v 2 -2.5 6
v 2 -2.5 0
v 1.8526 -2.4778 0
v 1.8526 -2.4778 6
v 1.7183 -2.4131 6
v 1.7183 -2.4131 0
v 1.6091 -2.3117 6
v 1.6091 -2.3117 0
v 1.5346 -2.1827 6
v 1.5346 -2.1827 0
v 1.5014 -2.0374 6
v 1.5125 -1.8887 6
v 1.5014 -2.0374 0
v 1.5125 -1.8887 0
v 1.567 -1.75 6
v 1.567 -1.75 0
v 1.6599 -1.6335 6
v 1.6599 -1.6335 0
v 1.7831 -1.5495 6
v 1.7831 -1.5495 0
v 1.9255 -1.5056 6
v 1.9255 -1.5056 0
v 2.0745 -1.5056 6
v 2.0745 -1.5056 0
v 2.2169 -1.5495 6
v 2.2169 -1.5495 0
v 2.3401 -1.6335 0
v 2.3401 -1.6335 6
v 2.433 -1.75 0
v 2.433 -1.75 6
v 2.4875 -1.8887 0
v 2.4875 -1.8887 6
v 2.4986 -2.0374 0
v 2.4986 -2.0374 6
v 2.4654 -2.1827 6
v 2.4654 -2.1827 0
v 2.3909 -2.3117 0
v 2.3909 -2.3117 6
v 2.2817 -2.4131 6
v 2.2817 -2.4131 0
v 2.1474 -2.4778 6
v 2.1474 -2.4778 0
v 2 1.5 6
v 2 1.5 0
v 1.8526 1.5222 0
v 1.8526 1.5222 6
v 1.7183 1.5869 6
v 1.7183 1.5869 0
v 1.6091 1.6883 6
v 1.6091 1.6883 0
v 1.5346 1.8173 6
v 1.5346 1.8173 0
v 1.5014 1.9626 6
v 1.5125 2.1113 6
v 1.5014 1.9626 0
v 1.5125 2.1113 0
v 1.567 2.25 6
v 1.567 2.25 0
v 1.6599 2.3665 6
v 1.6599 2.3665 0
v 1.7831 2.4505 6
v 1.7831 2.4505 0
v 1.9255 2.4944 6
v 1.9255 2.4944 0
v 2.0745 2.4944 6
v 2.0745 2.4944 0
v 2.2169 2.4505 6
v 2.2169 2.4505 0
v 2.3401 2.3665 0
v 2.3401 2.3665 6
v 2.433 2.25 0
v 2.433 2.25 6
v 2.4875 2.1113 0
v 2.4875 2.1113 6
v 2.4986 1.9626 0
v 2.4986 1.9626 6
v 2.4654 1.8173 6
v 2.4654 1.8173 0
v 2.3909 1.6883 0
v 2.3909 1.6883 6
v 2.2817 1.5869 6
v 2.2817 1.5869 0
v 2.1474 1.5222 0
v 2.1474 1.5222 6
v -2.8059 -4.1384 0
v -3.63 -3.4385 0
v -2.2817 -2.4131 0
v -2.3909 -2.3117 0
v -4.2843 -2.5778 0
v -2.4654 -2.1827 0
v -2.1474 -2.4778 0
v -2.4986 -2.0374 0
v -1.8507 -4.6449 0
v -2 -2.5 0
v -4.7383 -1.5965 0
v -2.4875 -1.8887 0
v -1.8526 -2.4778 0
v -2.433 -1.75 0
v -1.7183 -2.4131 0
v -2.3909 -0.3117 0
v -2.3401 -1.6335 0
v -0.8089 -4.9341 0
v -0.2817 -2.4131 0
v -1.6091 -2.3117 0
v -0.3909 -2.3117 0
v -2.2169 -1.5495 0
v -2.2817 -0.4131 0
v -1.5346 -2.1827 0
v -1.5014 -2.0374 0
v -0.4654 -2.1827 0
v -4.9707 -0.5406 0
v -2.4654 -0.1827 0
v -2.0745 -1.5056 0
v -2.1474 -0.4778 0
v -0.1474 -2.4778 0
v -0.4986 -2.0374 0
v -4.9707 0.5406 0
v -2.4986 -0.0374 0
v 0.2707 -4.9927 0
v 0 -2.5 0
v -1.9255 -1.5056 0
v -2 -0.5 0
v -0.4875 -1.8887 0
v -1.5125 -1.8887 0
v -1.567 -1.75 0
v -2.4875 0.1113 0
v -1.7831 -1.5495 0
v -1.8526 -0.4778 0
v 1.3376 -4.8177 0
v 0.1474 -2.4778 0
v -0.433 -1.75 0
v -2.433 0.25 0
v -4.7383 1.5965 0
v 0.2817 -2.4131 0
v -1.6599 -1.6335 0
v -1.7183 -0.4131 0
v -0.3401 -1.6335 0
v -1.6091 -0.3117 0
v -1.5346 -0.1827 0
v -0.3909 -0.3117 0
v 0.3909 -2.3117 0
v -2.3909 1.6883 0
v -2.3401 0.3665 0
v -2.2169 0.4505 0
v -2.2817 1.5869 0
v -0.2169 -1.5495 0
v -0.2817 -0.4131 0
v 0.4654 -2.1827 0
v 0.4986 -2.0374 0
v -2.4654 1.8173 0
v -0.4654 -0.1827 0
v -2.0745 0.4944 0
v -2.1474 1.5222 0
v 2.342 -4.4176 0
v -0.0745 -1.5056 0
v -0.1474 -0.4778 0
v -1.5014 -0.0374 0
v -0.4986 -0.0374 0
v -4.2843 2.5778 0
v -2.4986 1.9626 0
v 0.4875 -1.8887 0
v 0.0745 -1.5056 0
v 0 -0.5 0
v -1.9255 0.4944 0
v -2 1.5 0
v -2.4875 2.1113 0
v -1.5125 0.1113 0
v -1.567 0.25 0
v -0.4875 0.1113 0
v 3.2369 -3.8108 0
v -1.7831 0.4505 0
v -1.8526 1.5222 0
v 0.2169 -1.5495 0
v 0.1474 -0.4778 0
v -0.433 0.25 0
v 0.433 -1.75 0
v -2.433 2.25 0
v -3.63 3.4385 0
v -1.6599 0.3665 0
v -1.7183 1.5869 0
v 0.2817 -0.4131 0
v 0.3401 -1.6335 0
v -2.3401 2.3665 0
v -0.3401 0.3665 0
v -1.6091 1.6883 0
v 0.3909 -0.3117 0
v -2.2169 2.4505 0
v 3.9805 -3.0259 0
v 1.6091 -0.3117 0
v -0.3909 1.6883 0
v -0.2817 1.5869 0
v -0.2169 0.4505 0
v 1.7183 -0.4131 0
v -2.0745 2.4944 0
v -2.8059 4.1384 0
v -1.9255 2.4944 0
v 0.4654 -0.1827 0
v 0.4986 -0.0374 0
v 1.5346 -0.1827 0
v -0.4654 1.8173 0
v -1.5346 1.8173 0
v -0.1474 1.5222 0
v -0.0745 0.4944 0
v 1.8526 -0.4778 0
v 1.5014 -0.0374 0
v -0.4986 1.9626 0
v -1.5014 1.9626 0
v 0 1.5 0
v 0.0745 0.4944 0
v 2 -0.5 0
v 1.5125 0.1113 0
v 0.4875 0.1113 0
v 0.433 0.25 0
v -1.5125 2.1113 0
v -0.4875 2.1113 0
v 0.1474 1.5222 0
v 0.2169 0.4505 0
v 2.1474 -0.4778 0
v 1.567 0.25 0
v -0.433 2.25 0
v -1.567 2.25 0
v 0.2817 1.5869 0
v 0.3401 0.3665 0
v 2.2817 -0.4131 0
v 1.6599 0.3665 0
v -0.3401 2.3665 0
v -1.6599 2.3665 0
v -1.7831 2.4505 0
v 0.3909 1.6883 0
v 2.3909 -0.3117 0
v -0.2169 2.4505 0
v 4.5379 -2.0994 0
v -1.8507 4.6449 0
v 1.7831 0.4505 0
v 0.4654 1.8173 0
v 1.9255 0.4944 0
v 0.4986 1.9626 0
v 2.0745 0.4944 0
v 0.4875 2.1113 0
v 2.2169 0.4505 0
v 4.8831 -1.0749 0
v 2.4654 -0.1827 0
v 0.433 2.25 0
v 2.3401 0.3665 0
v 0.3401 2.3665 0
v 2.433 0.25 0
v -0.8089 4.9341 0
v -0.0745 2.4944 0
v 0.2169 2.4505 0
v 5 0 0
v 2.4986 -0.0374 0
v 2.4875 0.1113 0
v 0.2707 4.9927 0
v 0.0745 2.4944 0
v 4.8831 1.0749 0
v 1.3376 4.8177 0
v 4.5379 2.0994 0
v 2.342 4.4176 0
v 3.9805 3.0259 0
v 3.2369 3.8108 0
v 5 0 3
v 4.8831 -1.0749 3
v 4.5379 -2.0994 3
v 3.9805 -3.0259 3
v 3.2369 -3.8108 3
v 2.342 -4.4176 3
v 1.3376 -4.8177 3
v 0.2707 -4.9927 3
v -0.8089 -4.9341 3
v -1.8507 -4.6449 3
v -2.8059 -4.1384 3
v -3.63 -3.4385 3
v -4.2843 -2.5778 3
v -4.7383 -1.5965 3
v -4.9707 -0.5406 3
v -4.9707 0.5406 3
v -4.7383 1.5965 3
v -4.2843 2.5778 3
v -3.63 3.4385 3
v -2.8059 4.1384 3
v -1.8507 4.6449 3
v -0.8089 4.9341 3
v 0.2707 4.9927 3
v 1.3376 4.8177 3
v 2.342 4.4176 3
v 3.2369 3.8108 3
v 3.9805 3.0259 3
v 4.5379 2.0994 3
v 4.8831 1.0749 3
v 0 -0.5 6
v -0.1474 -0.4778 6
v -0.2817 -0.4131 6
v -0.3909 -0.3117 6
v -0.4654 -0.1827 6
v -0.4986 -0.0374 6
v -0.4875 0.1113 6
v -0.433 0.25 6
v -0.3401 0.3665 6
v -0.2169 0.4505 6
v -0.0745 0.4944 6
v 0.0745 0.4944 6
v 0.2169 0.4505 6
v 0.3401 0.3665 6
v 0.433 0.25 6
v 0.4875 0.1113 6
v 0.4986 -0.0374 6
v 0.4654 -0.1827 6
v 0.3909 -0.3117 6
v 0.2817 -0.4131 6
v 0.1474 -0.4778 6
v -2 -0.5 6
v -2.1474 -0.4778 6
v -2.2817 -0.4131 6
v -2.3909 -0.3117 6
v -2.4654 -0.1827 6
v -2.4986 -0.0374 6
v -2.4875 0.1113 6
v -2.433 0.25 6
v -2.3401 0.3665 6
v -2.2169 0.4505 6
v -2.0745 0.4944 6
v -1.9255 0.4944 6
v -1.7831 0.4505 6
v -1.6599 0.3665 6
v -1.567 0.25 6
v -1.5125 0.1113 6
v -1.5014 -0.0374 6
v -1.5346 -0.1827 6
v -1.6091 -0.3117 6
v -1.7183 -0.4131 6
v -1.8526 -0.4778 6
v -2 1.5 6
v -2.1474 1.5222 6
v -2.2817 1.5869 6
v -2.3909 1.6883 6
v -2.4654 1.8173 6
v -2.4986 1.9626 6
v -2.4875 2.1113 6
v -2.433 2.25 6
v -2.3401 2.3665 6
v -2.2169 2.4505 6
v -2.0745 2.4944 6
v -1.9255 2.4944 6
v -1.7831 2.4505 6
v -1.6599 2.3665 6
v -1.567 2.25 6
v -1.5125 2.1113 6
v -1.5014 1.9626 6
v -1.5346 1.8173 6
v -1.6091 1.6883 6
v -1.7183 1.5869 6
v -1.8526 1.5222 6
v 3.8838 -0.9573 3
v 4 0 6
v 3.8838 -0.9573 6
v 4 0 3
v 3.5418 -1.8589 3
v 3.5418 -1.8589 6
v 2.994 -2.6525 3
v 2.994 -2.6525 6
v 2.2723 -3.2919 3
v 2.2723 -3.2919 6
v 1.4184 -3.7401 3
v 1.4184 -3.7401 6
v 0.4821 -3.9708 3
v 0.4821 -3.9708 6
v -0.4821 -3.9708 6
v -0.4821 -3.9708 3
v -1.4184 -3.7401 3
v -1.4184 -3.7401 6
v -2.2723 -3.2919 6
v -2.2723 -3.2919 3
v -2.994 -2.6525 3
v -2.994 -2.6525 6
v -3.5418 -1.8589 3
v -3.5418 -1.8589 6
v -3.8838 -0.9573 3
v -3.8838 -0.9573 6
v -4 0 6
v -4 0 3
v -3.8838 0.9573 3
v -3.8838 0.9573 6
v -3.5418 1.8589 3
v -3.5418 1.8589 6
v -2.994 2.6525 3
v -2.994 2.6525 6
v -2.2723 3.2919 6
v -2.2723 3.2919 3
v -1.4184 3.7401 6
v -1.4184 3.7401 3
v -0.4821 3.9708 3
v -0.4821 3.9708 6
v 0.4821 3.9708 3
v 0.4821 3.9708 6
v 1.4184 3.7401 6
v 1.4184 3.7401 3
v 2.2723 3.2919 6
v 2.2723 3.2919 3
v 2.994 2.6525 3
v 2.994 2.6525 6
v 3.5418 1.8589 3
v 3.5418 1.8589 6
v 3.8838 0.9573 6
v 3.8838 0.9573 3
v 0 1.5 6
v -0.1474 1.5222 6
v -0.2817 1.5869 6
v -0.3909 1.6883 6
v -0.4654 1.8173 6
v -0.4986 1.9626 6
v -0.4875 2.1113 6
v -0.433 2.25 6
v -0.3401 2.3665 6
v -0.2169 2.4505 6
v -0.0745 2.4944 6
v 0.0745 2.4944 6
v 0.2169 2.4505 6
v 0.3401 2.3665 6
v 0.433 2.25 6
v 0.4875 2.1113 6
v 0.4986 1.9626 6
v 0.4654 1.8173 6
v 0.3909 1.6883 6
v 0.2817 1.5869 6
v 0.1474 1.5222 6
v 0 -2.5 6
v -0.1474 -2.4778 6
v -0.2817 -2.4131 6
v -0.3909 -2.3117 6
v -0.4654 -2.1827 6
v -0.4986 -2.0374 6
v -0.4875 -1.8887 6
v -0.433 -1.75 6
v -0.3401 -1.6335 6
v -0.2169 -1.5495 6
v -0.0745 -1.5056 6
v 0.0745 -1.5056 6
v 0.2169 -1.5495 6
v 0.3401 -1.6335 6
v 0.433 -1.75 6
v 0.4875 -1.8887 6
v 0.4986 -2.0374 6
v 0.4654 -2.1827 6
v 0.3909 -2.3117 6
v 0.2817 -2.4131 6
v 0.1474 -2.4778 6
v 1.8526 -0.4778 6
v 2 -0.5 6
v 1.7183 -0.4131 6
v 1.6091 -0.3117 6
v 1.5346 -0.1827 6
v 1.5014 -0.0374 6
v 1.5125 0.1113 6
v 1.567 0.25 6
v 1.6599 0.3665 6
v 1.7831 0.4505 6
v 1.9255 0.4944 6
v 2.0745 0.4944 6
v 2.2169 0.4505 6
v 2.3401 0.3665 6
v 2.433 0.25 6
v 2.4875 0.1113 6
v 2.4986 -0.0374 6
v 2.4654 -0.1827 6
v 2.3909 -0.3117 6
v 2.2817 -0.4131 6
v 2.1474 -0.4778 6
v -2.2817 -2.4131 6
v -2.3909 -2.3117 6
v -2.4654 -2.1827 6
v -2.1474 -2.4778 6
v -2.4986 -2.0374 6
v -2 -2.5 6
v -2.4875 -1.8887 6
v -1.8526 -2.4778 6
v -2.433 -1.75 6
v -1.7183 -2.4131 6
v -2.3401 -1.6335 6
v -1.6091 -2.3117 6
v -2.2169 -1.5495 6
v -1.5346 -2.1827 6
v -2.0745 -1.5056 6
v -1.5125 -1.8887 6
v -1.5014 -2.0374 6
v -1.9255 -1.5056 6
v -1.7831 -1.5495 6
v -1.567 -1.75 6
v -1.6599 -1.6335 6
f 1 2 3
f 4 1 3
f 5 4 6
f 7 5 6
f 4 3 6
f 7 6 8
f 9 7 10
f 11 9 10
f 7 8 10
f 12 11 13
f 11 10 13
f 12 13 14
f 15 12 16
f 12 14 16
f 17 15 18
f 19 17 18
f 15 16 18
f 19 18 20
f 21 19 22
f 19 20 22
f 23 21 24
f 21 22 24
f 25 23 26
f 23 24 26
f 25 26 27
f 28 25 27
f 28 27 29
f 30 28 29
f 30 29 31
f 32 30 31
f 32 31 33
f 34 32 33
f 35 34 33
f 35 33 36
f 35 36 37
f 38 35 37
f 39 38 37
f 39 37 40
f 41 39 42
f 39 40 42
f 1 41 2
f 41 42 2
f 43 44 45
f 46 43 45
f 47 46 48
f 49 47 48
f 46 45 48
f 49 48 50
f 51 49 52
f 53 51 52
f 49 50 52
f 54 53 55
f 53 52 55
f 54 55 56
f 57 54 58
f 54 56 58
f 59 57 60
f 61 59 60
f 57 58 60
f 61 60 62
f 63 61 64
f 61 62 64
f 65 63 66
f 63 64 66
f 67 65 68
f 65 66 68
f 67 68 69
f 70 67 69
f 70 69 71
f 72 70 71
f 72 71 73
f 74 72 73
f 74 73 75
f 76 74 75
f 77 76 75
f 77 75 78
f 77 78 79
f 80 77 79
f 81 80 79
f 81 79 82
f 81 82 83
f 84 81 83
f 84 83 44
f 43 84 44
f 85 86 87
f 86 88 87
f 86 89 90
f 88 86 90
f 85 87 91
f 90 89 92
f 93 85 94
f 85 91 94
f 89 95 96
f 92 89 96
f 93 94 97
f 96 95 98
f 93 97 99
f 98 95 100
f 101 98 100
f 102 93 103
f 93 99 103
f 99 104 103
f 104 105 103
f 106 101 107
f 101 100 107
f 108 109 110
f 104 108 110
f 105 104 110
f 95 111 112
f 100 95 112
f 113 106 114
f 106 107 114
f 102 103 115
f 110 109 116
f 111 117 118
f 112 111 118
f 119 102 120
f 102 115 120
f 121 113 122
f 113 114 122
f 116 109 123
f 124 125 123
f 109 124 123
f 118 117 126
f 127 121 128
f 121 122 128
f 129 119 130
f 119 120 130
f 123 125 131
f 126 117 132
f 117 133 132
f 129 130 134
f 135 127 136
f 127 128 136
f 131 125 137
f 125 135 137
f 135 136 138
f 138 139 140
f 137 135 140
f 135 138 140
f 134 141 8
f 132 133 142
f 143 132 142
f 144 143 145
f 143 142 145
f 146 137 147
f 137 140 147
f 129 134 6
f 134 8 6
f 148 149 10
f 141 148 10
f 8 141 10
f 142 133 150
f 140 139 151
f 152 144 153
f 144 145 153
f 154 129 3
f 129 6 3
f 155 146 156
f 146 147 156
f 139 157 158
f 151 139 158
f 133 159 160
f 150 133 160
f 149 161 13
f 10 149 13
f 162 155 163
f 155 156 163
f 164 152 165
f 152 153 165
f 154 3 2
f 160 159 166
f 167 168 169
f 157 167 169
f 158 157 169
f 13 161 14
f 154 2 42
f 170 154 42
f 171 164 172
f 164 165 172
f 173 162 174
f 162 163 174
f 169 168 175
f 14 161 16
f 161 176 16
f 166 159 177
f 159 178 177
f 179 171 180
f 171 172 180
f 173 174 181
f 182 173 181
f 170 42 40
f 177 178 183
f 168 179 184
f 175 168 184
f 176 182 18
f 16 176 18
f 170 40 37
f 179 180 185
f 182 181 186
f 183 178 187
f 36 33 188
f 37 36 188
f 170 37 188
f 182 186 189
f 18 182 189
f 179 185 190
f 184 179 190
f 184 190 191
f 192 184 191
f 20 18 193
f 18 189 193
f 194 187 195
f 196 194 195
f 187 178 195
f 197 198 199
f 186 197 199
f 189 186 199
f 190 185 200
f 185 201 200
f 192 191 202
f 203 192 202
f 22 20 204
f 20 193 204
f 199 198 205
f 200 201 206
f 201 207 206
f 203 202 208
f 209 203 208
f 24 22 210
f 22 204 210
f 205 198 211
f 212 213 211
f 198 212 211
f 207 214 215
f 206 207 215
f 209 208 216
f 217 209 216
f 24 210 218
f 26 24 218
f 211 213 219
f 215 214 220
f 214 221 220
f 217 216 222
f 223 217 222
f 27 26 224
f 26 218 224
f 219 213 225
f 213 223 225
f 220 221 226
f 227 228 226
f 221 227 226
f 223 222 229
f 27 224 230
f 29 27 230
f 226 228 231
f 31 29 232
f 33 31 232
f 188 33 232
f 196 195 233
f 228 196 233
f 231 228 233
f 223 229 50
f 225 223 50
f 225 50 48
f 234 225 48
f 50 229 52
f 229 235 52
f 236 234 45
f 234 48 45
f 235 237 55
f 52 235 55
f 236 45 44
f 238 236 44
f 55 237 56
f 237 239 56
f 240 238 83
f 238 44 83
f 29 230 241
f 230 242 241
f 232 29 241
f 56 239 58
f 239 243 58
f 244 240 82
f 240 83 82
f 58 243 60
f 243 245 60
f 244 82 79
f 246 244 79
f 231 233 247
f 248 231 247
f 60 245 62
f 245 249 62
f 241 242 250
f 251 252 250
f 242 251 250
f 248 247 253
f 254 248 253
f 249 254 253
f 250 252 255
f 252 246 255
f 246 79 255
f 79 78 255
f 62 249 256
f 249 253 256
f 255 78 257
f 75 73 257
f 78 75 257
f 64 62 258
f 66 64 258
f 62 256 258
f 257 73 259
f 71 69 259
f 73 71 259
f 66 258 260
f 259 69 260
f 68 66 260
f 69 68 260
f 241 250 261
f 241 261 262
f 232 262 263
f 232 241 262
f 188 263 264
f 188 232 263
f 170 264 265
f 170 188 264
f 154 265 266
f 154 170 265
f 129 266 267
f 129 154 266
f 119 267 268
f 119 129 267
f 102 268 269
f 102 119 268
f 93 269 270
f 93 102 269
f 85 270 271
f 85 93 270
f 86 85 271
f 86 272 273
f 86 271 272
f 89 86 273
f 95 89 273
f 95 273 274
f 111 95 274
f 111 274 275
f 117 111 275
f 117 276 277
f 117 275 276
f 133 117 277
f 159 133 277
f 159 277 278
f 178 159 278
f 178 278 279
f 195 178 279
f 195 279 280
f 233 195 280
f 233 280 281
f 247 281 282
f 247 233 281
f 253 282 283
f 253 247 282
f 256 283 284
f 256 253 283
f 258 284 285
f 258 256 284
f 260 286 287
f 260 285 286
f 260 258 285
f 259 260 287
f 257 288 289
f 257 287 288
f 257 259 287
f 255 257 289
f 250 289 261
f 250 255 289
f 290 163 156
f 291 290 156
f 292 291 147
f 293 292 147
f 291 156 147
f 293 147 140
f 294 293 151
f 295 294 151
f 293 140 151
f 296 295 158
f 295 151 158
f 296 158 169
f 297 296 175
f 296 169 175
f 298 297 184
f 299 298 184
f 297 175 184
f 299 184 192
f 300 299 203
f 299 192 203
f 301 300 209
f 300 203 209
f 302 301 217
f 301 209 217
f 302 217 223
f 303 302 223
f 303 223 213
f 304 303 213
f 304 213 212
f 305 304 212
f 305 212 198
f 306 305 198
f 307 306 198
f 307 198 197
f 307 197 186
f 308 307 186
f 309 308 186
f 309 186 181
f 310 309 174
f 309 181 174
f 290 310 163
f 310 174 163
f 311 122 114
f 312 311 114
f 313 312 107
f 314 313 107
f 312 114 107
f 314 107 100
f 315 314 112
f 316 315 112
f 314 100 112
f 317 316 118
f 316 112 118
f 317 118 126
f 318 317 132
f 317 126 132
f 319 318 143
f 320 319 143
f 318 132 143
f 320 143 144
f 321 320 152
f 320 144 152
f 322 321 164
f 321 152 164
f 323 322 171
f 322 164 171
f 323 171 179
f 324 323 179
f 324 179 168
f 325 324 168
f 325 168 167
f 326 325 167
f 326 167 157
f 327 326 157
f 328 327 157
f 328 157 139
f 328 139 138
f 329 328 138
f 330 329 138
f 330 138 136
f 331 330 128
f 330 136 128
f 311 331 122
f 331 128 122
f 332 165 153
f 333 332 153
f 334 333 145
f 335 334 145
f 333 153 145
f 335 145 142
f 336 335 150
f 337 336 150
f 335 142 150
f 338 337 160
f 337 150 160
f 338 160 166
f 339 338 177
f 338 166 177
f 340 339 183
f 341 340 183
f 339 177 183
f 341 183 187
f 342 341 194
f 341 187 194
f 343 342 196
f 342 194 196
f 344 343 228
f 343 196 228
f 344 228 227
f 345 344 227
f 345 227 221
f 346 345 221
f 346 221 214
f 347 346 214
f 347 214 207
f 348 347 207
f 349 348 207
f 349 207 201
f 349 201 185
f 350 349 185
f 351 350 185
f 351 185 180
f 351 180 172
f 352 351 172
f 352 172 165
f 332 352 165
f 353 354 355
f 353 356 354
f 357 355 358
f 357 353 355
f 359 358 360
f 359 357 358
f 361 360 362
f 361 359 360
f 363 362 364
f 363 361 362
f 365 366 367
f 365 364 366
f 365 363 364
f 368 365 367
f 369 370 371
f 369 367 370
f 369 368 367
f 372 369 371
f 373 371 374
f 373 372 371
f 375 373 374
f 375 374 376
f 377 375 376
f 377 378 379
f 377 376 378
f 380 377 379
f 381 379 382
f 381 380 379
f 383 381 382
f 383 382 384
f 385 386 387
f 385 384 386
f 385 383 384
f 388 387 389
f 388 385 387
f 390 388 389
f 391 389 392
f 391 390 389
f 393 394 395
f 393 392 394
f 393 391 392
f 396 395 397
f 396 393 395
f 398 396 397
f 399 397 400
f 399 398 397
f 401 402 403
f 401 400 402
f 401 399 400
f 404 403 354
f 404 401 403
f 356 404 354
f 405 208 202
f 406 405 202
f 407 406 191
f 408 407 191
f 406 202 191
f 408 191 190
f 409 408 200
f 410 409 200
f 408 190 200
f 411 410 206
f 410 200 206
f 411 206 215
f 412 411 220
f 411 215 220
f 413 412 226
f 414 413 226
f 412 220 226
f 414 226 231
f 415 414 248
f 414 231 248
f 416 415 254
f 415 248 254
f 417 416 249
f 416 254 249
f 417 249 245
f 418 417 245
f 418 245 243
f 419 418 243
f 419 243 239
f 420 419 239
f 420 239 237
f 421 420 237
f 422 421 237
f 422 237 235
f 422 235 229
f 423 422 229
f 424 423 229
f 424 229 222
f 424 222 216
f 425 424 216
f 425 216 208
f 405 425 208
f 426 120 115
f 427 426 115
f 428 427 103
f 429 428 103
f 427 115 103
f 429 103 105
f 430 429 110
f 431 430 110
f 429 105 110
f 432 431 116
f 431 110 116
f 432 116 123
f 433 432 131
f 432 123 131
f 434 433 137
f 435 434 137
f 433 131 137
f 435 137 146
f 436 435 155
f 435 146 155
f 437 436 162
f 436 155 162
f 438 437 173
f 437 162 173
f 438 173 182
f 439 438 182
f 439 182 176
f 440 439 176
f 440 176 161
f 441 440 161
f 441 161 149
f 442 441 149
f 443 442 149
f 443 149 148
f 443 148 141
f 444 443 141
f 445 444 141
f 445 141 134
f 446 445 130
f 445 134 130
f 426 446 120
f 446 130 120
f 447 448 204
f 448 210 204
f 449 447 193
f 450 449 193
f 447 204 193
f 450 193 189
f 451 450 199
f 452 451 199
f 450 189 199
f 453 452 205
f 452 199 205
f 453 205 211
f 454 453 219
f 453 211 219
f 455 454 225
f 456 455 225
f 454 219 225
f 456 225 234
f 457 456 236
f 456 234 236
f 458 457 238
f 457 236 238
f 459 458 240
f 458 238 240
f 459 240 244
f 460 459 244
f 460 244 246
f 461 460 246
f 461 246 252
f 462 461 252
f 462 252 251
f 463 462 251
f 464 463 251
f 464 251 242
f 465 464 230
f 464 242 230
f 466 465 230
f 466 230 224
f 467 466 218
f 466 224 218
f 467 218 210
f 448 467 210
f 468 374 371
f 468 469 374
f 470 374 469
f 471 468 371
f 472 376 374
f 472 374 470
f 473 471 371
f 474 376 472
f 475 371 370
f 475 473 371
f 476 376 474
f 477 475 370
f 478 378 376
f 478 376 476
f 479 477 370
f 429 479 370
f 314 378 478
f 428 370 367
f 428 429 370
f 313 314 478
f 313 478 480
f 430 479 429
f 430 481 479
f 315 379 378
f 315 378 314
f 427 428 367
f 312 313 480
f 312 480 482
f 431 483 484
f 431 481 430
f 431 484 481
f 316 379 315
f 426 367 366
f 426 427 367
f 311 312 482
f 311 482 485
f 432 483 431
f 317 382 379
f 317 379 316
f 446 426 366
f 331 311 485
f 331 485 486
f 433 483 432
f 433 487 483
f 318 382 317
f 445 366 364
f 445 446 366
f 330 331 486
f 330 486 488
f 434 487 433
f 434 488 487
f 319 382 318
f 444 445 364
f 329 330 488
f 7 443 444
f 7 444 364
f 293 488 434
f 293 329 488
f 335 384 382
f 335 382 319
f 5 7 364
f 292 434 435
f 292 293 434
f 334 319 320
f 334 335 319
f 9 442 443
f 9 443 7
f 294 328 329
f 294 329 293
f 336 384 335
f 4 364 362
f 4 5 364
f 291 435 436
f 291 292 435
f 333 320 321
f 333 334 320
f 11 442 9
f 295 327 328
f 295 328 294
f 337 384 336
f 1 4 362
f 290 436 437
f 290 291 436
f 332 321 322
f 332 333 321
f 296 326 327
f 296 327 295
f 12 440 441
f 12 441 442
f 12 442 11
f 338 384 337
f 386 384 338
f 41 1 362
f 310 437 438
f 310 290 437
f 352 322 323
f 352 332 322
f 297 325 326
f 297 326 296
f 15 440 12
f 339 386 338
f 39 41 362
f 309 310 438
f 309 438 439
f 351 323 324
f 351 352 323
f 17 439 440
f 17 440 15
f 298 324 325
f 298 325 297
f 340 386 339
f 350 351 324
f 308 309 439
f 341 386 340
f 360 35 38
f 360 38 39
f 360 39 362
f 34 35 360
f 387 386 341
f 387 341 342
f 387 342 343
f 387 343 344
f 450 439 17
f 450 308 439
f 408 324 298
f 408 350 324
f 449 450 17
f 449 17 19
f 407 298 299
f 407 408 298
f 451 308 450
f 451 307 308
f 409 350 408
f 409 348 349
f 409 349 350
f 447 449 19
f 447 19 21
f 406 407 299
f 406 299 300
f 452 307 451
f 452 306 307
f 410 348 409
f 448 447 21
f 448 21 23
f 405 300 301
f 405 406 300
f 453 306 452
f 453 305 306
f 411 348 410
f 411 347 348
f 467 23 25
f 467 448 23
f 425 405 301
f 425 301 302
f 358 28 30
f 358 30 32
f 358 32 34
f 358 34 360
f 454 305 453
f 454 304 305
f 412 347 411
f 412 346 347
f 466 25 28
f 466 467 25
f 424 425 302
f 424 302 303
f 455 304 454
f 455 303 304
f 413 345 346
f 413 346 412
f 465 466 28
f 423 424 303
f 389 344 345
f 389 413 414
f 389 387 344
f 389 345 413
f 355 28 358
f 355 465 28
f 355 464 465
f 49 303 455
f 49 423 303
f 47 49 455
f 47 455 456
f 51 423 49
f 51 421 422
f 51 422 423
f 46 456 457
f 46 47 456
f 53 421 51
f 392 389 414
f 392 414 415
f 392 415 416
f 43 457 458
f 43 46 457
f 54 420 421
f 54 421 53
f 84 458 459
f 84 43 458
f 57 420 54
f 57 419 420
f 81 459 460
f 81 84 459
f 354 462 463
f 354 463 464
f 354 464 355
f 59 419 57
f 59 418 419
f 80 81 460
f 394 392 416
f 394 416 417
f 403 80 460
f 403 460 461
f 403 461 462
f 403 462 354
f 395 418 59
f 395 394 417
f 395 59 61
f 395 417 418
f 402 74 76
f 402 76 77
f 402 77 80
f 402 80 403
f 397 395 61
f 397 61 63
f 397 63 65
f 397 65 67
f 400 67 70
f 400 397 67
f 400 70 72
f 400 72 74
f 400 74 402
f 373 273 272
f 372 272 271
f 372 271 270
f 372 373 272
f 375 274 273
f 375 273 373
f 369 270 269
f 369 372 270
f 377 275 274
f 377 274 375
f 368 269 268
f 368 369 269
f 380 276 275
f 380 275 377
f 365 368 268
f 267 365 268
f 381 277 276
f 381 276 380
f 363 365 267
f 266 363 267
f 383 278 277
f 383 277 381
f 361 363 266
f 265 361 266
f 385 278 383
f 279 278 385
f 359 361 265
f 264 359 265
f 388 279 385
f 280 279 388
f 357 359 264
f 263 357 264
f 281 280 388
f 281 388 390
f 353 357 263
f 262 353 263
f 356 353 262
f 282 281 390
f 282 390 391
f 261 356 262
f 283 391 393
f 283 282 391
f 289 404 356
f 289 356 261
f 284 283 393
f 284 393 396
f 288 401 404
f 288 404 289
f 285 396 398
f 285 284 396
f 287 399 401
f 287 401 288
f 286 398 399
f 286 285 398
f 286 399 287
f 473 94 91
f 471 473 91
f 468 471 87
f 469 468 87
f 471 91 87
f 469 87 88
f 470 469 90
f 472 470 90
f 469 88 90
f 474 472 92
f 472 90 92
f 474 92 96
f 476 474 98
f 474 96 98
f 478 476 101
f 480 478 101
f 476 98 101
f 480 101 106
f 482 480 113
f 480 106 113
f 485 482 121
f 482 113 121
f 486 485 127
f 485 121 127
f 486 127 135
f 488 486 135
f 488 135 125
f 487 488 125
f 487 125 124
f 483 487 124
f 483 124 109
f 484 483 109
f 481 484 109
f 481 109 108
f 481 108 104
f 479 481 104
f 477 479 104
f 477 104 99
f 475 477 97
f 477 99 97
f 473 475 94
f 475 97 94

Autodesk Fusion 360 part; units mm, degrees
sketch "Sketch1" plane through (0, 0, 0) normal (0, 0, 1) x (1, 0, 0)
  circle A0 centre (0, 0) radius 4
  circle A1 centre (0, 0) radius 5
  dimension "d1" = 8
  dimension "d2" = 1
extrude "Extrude1" add sketch "Sketch1" along normal blind 3
extrude "Extrude2" add sketch "Sketch1" along normal blind 6 contours A0
sketch "Sketch2" plane through (0, 0, 6) normal (0, 0, 1) x (-1, 0, 0)
  circle A0 centre (0, 0) radius 4
  circle A1 centre (-2, 2) radius 0.5
  circle A2 centre (0, 2) radius 0.5
  circle A3 centre (2, 2) radius 0.5
  circle A4 centre (-2, 0) radius 0.5
  circle A5 centre (0, 0) radius 0.5
  circle A6 centre (2, 0) radius 0.5
  circle A7 centre (-2, -2) radius 0.5
  circle A8 centre (0, -2) radius 0.5
  circle A9 centre (2, -2) radius 0.5
  point P0 (-2, 2)
  dimension "d7" = 1
  dimension "d8" = 1
  dimension "d9" = 1
  dimension "d10" = 1
  dimension "d11" = 1
  dimension "d12" = 1
  dimension "d13" = 1
  dimension "d14" = 1
  dimension "d15" = 1
hole "Hole1" at (2, -2, 6) at (0, -2, 6) at (-2, -2, 6) at (2, 0, 6) at (0, 0, 6) at (-2, 0, 6) at (2, 2, 6) at (0, 2, 6) at (-2, 2, 6) direction (0, 0, -1) diameter 1 depth 6 tip angle 180
